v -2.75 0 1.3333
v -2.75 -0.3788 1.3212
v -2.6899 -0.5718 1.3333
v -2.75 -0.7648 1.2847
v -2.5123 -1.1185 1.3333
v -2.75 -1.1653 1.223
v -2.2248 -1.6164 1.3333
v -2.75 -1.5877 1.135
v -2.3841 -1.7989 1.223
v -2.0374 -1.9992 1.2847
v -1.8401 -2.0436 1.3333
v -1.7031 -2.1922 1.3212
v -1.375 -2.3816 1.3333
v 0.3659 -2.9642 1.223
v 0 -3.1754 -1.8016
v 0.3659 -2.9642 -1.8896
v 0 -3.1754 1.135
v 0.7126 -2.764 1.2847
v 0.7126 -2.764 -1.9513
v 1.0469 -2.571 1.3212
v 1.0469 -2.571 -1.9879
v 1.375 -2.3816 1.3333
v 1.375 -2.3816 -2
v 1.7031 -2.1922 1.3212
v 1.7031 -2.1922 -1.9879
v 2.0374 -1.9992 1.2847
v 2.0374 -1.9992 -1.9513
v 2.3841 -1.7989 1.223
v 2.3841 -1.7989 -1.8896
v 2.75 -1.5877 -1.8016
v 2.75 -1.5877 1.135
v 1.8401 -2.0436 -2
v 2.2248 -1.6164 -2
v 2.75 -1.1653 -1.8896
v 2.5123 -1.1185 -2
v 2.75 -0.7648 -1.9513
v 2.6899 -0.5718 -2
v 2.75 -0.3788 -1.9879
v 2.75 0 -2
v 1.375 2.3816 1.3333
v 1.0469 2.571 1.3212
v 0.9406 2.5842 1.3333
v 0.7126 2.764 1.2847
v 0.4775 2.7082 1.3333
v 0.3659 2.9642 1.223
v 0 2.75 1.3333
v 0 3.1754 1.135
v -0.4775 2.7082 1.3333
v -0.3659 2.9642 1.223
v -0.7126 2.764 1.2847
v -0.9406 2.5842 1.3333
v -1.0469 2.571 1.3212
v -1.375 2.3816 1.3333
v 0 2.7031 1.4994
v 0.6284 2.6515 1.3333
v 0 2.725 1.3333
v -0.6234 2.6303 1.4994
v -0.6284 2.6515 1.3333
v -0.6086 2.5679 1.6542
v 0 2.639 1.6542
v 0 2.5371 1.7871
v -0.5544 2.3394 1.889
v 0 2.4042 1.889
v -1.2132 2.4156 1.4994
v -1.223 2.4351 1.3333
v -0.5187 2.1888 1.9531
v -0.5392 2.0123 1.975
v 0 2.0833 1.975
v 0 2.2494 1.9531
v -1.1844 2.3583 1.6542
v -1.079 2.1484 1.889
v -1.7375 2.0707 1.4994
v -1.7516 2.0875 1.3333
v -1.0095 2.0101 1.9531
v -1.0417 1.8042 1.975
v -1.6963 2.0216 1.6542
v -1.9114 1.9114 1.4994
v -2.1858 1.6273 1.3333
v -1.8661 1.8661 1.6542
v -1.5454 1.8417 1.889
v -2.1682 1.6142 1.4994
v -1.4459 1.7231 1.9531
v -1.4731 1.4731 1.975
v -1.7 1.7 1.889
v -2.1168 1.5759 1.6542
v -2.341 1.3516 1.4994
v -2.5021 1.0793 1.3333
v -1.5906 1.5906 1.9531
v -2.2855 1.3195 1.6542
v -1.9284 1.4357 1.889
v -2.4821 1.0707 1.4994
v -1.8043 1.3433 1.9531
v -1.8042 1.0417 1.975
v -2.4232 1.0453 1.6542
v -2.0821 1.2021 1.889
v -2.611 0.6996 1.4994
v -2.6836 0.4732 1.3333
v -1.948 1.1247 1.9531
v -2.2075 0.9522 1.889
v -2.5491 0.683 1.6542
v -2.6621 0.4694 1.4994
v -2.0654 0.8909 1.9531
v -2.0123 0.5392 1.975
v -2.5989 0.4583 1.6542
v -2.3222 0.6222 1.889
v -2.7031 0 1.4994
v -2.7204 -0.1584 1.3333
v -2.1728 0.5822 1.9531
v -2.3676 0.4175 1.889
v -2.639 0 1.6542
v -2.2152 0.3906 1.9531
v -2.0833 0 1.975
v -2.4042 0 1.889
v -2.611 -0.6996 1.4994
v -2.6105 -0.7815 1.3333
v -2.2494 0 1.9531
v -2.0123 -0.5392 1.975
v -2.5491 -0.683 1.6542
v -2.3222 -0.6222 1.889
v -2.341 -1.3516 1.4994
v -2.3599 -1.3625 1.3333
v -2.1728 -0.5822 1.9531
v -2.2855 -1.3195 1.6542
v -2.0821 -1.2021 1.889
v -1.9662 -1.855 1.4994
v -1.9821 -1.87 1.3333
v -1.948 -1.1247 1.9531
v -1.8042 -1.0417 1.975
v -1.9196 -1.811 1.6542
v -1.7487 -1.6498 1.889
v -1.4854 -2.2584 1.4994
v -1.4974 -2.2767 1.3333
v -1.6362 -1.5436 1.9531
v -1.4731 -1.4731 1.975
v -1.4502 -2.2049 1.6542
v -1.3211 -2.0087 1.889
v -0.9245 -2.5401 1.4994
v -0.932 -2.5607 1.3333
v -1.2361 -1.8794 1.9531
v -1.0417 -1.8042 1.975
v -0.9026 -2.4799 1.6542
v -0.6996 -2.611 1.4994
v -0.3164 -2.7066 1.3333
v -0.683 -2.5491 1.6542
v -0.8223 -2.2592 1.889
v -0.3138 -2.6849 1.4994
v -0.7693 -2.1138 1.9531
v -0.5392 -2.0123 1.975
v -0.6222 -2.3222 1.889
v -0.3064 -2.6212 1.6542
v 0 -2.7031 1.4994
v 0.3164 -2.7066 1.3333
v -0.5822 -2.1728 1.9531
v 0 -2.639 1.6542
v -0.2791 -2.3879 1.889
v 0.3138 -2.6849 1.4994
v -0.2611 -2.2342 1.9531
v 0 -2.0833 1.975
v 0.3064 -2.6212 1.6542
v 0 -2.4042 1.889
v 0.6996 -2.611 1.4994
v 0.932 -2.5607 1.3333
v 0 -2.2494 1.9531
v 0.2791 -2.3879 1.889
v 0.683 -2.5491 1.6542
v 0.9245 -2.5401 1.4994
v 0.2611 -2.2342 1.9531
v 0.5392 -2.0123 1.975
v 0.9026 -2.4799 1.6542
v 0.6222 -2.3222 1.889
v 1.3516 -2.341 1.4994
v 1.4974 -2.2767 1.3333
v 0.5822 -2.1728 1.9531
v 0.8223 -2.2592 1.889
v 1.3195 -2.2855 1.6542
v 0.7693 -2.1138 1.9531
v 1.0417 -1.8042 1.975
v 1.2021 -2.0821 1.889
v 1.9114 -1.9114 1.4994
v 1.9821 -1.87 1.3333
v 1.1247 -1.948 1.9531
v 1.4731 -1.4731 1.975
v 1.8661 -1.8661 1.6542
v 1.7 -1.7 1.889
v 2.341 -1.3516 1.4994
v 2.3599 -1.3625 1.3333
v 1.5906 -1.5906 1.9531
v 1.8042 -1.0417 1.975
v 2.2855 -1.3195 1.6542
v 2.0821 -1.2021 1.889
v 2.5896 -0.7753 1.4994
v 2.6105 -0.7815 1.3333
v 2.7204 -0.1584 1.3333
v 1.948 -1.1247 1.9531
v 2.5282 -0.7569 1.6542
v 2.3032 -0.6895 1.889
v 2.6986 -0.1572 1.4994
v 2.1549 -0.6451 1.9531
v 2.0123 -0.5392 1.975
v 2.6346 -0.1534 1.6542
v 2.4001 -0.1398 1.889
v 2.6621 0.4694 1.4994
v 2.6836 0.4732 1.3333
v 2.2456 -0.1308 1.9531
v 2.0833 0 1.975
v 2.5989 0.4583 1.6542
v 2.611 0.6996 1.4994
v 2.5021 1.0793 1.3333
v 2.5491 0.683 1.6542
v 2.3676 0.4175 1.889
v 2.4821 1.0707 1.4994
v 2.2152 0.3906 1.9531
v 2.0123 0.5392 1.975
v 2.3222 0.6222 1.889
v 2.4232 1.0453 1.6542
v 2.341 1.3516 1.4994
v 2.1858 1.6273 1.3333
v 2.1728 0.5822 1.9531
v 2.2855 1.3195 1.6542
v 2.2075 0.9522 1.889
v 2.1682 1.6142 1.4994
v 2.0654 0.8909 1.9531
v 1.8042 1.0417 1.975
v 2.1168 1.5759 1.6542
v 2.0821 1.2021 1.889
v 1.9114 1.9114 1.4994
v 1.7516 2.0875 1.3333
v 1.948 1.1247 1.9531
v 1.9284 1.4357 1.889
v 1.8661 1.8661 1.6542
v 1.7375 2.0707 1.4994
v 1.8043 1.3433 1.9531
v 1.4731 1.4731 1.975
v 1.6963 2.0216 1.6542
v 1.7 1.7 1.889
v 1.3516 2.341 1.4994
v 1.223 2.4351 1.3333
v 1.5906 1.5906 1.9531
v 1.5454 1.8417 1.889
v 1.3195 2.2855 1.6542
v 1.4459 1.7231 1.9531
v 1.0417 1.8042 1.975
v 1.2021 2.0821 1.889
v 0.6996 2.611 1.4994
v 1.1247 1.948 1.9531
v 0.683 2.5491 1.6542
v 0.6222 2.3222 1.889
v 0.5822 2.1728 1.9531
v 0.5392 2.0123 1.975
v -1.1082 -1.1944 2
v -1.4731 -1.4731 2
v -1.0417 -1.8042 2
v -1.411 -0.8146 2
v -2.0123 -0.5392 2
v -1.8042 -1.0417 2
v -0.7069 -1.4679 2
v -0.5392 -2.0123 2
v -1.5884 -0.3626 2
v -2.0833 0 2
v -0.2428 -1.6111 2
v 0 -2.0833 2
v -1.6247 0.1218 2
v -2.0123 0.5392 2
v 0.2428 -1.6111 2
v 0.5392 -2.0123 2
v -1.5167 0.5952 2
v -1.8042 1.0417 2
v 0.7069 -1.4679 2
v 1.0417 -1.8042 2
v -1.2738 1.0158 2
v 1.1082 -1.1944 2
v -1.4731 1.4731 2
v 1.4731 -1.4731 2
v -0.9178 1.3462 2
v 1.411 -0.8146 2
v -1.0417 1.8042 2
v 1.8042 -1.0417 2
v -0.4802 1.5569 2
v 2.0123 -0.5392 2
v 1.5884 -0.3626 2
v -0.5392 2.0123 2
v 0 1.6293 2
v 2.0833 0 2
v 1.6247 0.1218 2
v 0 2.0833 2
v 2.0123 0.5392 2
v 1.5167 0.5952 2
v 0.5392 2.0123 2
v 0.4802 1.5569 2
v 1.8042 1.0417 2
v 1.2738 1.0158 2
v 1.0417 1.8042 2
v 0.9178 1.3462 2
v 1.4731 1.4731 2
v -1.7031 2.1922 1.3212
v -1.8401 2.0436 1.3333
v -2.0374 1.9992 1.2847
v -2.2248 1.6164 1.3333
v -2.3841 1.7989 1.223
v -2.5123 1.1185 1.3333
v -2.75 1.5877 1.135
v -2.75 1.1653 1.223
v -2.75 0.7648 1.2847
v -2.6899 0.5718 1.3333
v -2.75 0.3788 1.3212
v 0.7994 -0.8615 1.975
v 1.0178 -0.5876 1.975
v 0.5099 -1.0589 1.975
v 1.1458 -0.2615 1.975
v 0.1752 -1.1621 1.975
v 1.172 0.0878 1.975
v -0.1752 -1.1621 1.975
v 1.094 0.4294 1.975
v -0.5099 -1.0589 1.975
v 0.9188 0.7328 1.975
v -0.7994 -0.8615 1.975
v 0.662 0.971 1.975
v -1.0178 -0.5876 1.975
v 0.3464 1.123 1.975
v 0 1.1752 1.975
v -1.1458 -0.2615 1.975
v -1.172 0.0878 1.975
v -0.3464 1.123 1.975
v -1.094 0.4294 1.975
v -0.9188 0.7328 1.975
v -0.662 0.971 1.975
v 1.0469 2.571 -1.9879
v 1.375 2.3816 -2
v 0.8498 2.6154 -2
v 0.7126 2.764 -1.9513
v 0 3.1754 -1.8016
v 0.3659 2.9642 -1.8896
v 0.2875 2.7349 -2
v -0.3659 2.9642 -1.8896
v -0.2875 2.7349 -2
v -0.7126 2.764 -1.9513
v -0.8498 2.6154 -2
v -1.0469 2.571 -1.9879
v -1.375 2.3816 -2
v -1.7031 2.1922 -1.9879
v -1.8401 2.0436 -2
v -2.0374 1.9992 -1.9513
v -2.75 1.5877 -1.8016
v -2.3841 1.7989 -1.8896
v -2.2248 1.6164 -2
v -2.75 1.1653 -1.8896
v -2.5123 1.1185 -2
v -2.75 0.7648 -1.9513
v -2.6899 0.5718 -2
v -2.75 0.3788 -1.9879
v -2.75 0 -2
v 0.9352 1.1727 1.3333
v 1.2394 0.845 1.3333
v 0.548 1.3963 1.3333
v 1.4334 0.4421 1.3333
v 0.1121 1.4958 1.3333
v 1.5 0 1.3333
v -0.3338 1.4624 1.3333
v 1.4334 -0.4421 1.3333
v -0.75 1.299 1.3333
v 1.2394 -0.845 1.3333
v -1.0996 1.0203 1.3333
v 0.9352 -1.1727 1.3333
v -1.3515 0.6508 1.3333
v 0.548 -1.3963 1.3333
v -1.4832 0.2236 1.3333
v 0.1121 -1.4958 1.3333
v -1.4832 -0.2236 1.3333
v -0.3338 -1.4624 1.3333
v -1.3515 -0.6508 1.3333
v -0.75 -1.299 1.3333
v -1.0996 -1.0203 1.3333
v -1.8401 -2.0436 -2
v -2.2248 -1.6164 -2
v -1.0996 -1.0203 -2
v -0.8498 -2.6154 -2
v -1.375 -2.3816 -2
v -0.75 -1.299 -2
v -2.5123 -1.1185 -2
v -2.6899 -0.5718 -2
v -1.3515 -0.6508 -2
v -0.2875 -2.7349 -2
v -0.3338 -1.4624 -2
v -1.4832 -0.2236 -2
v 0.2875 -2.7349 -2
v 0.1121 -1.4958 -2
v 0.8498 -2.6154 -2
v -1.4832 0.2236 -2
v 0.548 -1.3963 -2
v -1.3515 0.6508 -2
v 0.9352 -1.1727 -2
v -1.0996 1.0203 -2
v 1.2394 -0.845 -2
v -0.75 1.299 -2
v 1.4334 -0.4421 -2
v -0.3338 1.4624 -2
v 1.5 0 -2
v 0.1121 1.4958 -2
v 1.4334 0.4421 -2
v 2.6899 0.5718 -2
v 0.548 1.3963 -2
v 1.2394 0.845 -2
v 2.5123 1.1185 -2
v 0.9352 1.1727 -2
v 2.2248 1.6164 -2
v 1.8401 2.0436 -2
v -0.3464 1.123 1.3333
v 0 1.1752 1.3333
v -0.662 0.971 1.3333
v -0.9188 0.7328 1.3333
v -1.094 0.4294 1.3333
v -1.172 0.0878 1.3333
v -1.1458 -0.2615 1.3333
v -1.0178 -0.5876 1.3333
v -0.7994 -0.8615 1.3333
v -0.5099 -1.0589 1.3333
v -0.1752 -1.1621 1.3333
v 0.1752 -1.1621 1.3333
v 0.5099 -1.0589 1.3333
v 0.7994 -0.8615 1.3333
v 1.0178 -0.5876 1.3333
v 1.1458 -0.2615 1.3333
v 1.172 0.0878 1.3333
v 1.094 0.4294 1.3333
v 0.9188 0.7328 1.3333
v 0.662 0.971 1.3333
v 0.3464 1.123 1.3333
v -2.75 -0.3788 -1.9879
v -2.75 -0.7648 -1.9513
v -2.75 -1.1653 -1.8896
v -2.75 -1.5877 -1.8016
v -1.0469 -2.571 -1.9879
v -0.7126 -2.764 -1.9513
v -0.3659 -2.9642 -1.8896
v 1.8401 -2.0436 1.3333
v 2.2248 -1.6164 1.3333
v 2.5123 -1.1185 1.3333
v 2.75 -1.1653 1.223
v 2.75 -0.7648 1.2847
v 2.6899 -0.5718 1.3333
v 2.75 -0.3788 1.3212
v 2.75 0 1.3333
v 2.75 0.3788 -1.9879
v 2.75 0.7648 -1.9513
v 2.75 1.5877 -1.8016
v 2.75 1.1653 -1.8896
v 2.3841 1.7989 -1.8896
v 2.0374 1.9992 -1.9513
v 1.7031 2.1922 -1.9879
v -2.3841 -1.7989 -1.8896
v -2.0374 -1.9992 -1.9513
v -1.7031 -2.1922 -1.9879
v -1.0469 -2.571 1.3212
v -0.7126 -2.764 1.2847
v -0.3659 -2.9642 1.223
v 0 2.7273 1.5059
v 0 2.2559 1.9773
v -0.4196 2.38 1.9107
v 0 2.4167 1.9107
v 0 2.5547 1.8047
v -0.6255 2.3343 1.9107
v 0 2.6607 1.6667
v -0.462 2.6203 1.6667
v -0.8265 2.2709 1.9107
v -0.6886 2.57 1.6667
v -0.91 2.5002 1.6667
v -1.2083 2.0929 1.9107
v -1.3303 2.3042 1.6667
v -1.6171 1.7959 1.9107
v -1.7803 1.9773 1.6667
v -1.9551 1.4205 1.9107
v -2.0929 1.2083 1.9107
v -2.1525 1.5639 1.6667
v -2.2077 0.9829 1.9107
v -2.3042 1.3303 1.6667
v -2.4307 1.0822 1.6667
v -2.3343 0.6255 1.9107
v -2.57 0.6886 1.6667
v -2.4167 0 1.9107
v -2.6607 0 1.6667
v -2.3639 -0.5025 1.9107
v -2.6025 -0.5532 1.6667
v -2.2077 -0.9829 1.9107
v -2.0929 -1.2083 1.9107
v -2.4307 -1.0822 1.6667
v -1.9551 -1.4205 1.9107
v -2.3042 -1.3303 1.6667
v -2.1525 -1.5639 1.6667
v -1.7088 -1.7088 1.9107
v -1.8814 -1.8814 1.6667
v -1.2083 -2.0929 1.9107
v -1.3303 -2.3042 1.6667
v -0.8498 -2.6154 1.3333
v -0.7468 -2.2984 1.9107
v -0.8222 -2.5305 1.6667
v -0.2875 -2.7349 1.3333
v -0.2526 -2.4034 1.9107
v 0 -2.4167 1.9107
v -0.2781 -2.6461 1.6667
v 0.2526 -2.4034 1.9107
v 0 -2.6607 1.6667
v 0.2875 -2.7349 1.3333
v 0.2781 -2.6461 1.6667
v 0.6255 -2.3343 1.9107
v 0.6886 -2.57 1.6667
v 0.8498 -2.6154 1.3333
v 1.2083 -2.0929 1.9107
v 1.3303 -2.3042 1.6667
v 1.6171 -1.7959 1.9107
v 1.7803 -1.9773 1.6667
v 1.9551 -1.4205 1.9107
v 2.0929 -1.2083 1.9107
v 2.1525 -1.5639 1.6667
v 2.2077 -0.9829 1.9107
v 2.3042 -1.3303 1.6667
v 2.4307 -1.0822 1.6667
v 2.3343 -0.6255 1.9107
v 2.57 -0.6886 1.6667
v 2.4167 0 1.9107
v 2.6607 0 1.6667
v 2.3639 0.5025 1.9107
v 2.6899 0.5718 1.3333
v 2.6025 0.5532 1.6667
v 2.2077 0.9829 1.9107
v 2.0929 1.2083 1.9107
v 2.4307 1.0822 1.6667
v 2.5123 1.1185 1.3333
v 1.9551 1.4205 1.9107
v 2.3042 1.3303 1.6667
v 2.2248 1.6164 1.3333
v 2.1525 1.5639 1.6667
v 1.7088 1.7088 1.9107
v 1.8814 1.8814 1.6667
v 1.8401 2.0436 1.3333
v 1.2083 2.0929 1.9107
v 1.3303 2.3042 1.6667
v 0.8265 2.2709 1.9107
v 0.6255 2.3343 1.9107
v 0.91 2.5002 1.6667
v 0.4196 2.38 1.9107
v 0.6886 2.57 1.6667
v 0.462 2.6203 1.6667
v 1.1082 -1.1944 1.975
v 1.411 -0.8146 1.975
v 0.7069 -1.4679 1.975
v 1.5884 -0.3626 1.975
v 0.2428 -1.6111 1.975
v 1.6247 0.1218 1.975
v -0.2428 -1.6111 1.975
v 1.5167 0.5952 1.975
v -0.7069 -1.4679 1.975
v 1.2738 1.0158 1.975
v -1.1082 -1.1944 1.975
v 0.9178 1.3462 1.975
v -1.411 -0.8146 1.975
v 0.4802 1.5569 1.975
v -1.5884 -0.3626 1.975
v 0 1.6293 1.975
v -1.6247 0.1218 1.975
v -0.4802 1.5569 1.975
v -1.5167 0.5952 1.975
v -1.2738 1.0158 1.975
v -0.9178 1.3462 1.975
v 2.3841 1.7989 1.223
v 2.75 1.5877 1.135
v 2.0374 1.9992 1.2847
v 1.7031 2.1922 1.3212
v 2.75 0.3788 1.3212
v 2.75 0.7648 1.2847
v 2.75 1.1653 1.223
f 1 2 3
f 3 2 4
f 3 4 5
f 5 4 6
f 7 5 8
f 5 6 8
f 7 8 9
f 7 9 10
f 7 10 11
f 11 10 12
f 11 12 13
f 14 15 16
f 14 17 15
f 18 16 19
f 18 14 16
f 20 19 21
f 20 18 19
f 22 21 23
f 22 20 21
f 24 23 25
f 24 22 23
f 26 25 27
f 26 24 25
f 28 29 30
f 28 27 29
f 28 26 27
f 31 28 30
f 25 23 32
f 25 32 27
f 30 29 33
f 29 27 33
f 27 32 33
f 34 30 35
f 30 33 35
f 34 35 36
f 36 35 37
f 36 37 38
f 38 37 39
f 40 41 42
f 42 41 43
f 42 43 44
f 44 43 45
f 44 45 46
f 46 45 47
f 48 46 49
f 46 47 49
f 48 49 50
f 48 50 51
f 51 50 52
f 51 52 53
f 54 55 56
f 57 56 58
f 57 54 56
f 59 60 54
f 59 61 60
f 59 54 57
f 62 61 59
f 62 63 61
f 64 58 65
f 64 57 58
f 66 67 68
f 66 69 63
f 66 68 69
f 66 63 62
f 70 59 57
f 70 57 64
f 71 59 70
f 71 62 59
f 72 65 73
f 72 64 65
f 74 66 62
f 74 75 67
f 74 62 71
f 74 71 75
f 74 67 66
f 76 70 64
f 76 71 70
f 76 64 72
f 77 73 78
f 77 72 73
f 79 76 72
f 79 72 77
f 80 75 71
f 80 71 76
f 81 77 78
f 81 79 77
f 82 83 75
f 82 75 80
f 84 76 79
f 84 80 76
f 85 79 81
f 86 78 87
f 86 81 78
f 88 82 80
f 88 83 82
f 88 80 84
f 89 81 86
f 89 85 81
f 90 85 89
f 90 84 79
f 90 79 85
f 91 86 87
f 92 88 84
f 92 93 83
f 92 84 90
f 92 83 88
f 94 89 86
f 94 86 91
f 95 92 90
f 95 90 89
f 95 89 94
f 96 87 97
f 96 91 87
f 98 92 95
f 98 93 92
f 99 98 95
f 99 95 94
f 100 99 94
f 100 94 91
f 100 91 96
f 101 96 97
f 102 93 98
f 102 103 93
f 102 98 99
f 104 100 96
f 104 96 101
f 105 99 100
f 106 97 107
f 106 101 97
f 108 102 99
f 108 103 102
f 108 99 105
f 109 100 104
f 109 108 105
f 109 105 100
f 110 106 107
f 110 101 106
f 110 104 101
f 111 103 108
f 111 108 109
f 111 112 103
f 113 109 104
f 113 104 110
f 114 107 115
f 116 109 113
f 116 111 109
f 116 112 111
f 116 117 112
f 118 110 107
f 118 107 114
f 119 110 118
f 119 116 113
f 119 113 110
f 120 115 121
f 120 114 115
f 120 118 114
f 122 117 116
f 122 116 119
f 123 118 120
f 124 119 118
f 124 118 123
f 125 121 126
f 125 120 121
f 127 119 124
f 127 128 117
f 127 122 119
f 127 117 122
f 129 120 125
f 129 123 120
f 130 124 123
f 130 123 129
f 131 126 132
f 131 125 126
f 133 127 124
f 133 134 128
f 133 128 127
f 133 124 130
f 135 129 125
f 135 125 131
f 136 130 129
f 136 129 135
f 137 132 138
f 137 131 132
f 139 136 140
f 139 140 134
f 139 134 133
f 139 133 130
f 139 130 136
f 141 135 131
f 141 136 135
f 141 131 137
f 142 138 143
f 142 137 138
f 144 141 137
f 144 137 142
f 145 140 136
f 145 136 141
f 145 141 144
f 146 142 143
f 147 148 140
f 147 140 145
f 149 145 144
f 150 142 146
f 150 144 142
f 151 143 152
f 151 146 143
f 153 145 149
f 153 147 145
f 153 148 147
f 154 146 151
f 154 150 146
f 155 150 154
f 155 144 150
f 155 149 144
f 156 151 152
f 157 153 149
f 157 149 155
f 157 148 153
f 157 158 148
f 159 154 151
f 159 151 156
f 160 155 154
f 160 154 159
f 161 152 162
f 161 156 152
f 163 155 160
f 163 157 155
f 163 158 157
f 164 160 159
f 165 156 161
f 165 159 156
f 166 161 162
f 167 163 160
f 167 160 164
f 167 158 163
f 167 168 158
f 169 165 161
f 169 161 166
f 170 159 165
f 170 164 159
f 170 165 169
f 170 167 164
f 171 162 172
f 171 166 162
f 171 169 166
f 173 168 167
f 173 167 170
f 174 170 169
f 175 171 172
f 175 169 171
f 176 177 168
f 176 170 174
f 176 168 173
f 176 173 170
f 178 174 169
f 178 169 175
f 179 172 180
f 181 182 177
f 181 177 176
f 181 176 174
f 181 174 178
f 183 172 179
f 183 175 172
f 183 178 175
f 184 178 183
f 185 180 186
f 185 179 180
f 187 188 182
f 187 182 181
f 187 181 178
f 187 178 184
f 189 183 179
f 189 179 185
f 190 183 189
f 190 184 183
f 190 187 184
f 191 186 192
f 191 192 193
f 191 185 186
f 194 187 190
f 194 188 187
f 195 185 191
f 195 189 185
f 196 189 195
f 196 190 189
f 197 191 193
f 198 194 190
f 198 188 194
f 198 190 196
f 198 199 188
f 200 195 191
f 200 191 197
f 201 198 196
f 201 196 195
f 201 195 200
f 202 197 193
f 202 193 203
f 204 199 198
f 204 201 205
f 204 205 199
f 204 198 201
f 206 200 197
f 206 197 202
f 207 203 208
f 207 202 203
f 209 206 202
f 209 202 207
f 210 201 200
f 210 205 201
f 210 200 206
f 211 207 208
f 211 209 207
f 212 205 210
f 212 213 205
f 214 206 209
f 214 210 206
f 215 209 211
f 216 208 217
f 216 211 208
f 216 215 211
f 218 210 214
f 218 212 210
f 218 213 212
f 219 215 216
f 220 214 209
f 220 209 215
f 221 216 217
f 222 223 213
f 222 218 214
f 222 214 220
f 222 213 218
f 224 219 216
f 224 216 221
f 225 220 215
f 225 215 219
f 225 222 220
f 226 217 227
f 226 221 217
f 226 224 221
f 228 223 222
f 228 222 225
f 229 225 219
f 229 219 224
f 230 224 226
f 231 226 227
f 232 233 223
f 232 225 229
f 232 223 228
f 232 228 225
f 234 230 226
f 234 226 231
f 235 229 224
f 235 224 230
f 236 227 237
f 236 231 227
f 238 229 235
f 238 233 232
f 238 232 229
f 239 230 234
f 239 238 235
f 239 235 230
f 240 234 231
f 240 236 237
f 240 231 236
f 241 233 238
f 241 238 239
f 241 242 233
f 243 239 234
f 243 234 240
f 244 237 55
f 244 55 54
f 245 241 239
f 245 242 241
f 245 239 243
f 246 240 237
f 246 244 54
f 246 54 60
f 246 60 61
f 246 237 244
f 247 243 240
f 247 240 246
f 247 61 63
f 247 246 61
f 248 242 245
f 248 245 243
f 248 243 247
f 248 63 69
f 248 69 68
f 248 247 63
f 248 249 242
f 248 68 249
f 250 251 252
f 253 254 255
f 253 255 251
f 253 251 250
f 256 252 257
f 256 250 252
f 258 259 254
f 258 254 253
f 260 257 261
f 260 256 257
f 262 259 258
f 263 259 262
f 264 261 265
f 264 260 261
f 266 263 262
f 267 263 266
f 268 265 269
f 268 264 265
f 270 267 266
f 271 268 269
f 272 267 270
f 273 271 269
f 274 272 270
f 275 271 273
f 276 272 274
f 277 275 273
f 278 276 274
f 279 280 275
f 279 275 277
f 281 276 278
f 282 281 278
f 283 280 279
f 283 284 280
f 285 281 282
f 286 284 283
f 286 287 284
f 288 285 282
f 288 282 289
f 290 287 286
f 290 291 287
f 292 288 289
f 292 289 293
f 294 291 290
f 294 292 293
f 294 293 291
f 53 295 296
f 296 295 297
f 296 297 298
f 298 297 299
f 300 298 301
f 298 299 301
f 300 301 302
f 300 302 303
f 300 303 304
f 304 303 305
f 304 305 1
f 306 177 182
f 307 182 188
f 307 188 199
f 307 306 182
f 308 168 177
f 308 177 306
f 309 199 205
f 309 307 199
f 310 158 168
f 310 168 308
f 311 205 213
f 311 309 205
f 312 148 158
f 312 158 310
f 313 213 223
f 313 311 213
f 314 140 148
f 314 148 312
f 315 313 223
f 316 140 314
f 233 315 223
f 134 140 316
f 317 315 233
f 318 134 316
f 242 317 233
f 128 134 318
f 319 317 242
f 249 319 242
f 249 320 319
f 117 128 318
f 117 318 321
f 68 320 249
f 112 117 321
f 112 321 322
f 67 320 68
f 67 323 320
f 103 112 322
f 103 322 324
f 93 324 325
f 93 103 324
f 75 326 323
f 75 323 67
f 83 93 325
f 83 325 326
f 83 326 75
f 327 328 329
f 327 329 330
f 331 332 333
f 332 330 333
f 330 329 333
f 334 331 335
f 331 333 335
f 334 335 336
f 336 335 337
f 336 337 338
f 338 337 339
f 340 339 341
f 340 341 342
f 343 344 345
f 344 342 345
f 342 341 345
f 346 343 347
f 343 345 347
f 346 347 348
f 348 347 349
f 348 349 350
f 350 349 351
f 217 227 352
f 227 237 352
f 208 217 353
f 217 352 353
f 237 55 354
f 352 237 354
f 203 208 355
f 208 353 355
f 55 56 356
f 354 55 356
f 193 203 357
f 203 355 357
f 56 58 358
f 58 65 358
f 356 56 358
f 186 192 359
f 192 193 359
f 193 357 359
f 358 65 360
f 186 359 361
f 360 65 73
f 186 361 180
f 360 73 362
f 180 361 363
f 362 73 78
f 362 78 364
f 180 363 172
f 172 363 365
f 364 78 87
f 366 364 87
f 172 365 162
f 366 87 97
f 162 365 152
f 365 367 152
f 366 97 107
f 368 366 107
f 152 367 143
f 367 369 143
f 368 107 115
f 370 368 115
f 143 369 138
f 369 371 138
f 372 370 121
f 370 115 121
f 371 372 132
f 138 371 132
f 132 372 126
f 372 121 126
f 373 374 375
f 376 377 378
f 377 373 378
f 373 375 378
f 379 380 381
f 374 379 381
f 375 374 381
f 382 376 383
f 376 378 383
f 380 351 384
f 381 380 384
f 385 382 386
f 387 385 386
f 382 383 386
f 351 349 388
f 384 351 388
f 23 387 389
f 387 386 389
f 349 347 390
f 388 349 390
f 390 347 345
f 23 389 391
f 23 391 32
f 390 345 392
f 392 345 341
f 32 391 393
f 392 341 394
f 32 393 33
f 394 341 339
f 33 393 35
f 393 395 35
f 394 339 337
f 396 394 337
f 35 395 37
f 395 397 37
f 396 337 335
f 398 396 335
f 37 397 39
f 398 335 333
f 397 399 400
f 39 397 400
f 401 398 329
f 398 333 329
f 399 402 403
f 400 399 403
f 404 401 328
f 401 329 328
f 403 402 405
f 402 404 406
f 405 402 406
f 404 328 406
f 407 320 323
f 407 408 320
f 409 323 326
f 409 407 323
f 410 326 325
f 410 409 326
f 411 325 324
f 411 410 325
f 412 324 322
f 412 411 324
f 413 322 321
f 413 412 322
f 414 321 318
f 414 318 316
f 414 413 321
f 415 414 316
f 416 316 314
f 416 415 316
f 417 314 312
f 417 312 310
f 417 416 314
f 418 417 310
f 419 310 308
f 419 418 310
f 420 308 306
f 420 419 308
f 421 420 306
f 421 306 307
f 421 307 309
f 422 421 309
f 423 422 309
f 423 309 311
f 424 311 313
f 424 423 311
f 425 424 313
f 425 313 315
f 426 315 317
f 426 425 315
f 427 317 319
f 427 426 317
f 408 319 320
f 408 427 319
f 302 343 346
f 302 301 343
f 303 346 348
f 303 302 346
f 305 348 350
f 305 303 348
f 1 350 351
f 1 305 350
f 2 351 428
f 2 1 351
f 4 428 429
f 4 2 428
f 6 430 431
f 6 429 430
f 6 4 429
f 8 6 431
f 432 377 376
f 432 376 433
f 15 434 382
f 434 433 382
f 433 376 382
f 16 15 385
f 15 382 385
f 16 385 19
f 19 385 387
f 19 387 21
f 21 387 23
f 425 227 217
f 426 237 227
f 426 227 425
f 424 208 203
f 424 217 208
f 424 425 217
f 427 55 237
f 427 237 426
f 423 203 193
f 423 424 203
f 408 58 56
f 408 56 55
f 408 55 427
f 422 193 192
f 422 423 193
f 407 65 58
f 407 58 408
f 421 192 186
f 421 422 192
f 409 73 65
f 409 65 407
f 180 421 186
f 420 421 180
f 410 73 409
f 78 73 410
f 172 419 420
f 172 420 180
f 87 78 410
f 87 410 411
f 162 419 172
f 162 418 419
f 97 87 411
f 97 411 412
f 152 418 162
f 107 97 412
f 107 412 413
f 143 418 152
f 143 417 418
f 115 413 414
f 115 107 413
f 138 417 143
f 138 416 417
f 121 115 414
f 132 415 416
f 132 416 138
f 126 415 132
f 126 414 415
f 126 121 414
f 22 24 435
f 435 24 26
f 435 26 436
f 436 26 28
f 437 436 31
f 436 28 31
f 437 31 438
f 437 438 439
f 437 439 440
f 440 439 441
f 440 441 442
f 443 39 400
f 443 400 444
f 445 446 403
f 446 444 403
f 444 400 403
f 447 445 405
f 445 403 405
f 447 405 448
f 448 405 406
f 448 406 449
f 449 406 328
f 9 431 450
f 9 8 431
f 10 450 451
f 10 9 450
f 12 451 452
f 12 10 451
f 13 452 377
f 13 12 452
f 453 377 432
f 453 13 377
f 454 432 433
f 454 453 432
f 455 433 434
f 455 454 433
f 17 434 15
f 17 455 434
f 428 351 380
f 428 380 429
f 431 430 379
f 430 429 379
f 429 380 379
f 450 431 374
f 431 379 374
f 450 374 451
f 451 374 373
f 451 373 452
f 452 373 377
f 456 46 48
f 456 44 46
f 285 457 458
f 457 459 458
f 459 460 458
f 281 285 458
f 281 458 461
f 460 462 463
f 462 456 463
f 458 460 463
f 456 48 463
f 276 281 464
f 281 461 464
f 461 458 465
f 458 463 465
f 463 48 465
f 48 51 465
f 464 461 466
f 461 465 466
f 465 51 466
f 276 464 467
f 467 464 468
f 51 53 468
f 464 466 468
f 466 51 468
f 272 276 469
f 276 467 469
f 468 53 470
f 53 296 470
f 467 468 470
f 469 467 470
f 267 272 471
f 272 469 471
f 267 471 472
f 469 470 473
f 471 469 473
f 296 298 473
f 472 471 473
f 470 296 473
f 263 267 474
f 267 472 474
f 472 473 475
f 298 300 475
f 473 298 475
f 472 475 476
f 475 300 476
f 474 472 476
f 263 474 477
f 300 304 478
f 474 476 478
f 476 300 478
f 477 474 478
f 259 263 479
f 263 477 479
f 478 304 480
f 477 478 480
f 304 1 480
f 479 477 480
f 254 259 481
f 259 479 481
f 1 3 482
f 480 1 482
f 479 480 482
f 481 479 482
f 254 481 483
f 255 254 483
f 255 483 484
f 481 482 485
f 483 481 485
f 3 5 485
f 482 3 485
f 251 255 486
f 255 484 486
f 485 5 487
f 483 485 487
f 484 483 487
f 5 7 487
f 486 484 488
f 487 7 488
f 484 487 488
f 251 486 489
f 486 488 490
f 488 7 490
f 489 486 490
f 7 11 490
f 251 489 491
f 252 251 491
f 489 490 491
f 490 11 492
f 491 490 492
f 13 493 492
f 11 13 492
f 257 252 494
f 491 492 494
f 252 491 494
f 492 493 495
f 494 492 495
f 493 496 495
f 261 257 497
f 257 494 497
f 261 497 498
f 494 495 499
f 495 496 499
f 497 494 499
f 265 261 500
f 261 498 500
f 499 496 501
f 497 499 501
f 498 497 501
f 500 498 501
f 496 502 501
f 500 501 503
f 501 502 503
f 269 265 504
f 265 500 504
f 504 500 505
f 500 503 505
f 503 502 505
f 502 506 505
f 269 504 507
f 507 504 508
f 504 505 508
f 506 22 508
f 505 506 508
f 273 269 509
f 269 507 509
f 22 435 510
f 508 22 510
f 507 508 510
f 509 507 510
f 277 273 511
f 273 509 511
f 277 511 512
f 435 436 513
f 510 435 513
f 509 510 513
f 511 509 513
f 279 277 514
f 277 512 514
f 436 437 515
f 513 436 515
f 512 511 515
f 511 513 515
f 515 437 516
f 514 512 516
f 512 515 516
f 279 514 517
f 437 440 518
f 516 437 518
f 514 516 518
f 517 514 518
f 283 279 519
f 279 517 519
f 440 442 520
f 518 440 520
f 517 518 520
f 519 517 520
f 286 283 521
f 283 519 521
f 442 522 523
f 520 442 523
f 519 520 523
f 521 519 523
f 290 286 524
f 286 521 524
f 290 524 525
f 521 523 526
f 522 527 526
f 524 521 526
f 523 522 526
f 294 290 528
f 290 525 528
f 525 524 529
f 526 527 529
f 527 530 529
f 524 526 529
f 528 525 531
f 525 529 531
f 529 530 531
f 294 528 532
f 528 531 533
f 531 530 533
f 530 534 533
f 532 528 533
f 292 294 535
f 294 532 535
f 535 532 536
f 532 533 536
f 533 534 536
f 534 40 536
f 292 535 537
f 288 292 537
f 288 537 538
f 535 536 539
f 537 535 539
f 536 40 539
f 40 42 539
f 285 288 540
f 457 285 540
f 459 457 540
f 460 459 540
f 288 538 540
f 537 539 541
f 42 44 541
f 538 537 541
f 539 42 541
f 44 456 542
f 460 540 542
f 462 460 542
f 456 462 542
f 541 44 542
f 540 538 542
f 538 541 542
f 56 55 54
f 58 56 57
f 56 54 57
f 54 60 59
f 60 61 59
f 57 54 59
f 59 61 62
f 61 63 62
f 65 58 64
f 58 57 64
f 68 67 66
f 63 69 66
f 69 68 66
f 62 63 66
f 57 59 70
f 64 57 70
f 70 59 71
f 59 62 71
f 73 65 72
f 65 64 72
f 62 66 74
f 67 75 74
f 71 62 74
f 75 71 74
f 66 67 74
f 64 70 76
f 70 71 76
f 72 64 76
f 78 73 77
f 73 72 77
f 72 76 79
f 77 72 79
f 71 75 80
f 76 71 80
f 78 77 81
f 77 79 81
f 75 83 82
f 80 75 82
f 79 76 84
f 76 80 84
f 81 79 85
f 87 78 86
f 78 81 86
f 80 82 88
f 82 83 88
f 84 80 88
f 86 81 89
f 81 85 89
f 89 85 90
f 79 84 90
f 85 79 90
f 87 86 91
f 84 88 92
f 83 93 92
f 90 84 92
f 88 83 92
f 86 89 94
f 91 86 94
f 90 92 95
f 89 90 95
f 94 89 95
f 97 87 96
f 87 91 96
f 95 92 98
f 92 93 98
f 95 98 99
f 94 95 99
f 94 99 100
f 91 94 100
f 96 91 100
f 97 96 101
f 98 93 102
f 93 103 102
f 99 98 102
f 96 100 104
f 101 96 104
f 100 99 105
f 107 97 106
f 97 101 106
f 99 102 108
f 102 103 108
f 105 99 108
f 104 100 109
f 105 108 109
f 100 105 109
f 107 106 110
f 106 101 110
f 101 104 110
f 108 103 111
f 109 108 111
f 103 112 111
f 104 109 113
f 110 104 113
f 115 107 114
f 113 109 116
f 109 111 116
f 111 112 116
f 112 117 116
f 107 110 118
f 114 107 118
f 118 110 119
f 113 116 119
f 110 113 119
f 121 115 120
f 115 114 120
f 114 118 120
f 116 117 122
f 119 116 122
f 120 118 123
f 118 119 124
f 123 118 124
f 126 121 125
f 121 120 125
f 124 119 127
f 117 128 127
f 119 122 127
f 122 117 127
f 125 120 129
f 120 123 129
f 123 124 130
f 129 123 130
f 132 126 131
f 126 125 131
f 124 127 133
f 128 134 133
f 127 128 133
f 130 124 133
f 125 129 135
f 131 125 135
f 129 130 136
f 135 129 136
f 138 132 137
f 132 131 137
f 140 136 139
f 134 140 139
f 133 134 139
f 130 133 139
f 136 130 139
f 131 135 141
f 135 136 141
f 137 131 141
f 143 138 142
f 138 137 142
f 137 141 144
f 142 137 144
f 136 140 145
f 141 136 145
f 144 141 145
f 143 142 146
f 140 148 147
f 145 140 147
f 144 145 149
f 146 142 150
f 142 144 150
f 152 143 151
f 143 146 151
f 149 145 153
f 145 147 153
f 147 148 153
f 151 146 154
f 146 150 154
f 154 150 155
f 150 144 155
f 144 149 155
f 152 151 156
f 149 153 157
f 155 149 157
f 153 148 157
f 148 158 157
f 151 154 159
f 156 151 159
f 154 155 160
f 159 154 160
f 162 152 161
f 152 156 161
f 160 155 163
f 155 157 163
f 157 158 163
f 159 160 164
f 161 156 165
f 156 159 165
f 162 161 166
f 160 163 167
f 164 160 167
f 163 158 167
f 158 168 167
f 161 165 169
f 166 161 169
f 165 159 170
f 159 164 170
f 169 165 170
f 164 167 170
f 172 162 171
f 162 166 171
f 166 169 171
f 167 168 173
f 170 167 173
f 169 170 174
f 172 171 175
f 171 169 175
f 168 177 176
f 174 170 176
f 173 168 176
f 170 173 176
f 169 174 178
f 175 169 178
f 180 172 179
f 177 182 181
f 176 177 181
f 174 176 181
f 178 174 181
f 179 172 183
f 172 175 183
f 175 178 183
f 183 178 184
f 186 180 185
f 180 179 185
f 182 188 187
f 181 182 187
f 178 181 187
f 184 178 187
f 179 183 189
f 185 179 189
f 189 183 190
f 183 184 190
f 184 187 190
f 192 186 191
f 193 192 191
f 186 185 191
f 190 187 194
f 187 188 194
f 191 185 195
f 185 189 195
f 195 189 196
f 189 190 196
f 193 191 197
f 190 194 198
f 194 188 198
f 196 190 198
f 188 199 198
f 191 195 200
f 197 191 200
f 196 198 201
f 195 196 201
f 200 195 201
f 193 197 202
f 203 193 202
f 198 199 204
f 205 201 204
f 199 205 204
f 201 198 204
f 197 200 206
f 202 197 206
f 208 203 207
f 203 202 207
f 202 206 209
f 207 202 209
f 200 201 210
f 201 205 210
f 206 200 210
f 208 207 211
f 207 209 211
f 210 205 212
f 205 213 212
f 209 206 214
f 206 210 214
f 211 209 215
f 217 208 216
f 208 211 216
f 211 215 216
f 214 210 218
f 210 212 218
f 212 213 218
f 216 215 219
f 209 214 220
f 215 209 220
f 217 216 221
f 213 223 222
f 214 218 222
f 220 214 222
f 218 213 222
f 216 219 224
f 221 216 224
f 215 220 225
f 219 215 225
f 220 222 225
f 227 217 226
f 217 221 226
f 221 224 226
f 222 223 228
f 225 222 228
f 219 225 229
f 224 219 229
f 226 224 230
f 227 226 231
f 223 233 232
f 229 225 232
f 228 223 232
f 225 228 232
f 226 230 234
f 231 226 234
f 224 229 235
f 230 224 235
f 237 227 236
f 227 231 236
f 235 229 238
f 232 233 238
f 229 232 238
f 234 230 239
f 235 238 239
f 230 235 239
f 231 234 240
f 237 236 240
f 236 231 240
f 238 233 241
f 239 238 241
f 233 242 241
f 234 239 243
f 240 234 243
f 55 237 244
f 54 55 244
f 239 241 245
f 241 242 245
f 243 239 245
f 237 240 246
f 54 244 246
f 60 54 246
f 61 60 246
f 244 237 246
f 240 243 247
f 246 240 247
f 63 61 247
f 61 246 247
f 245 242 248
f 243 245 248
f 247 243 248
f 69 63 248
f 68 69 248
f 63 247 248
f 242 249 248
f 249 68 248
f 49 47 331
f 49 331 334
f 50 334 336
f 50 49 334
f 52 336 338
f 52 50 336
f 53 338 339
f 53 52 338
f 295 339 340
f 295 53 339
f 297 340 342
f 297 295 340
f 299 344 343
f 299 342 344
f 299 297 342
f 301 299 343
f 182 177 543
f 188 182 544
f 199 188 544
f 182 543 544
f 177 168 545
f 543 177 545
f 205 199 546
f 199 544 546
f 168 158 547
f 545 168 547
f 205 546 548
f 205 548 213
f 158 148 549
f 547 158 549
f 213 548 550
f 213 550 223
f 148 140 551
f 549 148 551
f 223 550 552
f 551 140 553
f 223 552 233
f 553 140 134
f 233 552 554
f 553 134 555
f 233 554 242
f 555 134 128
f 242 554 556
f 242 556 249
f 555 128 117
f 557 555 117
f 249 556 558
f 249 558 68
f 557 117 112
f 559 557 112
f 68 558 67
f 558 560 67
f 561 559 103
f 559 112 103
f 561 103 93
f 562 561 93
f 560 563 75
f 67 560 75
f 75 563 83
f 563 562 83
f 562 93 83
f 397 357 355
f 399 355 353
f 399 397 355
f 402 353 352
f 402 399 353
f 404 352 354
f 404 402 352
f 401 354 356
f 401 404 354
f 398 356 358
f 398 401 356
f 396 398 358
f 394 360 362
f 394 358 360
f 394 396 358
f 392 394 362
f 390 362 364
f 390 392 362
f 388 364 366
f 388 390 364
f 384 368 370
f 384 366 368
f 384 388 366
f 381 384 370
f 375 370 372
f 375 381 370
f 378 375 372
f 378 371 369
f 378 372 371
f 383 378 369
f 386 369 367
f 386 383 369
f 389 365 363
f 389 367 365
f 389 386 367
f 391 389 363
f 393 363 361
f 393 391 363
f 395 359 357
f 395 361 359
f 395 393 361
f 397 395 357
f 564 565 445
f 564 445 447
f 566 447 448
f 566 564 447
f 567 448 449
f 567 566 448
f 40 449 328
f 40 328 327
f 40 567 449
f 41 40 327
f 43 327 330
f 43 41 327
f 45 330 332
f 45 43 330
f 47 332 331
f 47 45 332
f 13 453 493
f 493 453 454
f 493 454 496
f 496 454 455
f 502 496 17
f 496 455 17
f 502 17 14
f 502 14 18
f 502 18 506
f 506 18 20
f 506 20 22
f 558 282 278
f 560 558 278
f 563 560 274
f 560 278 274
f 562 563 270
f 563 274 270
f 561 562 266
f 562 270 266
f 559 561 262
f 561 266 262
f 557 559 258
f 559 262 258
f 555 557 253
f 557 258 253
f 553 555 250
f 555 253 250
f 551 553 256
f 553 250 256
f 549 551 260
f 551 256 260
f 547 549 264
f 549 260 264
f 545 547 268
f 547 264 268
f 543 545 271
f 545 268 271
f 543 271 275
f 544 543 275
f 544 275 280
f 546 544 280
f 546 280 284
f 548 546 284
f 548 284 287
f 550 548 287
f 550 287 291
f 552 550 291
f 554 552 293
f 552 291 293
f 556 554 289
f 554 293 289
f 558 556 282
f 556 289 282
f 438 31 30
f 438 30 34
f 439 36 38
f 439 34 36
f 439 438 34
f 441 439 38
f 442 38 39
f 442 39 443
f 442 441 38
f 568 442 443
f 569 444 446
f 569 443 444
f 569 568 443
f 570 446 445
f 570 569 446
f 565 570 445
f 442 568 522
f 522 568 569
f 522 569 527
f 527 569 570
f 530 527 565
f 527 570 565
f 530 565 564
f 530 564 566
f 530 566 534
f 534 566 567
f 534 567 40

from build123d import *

# Parameters (mm, degrees)
SKETCH3_R           = 1.5
BOSS_EXTRUDE1_DEPTH = 2


with BuildPart() as part:
    # Sketch3 → Boss-Extrude1 (new, symmetric)
    with BuildSketch(Plane.XY):
        Polygon((0, -3.175426481), (2.75, -1.58771324), (2.75, 1.58771324), (0, 3.175426481), (-2.75, 1.58771324), (-2.75, -1.58771324), align=None)
        Circle(SKETCH3_R, mode=Mode.SUBTRACT)
    extrude(amount=BOSS_EXTRUDE1_DEPTH, both=True)

    # Sketch4 → Cut-Revolve1 (revolve, cut)
    with BuildSketch(Plane(origin=(0, 0, 0), x_dir=(0, 0, -1), z_dir=(1, 0, 0))):
        with BuildLine():
            Line((3.27, 4.445426481), (-3.27, 4.445426481))
            Line((-3.27, 4.445426481), (-3.27, 2.083333333))
            Line((-3.27, 2.083333333), (-2, 2.083333333))
            ThreePointArc((-2, 2.083333333), (-1.804737854, 2.554737854), (-1.333333333, 2.75))
            Line((-1.333333333, 2.75), (-1.134953707, 3.175426481))
            Line((-1.134953707, 3.175426481), (1.801620374, 3.175426481))
            Line((1.801620374, 3.175426481), (2, 2.75))
            Line((2, 2.75), (2, 0))
            Line((2, 0), (3.27, 0))
            Line((3.27, 0), (3.27, 4.445426481))
        make_face()
        with BuildLine():
            Line((-3.27, 1.629286903), (-3.27, 0))
            Line((-3.27, 0), (-1.333333333, 0))
            Line((-1.333333333, 0), (-1.333333333, 2.725))
            ThreePointArc((-1.333333333, 2.725), (-1.787060185, 2.537060185), (-1.975, 2.083333333))
            Line((-1.975, 2.083333333), (-1.975, 1.629286903))
            Line((-1.975, 1.629286903), (-3.27, 1.629286903))
        make_face()
    revolve(axis=Axis((0, 0, -2), (0, 0, 1)), mode=Mode.SUBTRACT)


with BuildPart() as body_2:
    # Sketch5 → Revolve1 (revolve)
    with BuildSketch(Plane(origin=(0, 0, 0), x_dir=(0, 0, -1), z_dir=(1, 0, 0))):
        with BuildLine():
            Line((-1.975, 2.083333333), (-1.975, 1.175240474))
            Line((-1.975, 1.175240474), (-1.333333333, 1.175240474))
            Line((-1.333333333, 1.175240474), (-1.333333333, 2.725))
            ThreePointArc((-1.333333333, 2.725), (-1.787060185, 2.537060185), (-1.975, 2.083333333))
        make_face()
    revolve(axis=Axis((0, 0, -2), (0, 0, 1)))


solid = Compound([part.part, body_2.part])
